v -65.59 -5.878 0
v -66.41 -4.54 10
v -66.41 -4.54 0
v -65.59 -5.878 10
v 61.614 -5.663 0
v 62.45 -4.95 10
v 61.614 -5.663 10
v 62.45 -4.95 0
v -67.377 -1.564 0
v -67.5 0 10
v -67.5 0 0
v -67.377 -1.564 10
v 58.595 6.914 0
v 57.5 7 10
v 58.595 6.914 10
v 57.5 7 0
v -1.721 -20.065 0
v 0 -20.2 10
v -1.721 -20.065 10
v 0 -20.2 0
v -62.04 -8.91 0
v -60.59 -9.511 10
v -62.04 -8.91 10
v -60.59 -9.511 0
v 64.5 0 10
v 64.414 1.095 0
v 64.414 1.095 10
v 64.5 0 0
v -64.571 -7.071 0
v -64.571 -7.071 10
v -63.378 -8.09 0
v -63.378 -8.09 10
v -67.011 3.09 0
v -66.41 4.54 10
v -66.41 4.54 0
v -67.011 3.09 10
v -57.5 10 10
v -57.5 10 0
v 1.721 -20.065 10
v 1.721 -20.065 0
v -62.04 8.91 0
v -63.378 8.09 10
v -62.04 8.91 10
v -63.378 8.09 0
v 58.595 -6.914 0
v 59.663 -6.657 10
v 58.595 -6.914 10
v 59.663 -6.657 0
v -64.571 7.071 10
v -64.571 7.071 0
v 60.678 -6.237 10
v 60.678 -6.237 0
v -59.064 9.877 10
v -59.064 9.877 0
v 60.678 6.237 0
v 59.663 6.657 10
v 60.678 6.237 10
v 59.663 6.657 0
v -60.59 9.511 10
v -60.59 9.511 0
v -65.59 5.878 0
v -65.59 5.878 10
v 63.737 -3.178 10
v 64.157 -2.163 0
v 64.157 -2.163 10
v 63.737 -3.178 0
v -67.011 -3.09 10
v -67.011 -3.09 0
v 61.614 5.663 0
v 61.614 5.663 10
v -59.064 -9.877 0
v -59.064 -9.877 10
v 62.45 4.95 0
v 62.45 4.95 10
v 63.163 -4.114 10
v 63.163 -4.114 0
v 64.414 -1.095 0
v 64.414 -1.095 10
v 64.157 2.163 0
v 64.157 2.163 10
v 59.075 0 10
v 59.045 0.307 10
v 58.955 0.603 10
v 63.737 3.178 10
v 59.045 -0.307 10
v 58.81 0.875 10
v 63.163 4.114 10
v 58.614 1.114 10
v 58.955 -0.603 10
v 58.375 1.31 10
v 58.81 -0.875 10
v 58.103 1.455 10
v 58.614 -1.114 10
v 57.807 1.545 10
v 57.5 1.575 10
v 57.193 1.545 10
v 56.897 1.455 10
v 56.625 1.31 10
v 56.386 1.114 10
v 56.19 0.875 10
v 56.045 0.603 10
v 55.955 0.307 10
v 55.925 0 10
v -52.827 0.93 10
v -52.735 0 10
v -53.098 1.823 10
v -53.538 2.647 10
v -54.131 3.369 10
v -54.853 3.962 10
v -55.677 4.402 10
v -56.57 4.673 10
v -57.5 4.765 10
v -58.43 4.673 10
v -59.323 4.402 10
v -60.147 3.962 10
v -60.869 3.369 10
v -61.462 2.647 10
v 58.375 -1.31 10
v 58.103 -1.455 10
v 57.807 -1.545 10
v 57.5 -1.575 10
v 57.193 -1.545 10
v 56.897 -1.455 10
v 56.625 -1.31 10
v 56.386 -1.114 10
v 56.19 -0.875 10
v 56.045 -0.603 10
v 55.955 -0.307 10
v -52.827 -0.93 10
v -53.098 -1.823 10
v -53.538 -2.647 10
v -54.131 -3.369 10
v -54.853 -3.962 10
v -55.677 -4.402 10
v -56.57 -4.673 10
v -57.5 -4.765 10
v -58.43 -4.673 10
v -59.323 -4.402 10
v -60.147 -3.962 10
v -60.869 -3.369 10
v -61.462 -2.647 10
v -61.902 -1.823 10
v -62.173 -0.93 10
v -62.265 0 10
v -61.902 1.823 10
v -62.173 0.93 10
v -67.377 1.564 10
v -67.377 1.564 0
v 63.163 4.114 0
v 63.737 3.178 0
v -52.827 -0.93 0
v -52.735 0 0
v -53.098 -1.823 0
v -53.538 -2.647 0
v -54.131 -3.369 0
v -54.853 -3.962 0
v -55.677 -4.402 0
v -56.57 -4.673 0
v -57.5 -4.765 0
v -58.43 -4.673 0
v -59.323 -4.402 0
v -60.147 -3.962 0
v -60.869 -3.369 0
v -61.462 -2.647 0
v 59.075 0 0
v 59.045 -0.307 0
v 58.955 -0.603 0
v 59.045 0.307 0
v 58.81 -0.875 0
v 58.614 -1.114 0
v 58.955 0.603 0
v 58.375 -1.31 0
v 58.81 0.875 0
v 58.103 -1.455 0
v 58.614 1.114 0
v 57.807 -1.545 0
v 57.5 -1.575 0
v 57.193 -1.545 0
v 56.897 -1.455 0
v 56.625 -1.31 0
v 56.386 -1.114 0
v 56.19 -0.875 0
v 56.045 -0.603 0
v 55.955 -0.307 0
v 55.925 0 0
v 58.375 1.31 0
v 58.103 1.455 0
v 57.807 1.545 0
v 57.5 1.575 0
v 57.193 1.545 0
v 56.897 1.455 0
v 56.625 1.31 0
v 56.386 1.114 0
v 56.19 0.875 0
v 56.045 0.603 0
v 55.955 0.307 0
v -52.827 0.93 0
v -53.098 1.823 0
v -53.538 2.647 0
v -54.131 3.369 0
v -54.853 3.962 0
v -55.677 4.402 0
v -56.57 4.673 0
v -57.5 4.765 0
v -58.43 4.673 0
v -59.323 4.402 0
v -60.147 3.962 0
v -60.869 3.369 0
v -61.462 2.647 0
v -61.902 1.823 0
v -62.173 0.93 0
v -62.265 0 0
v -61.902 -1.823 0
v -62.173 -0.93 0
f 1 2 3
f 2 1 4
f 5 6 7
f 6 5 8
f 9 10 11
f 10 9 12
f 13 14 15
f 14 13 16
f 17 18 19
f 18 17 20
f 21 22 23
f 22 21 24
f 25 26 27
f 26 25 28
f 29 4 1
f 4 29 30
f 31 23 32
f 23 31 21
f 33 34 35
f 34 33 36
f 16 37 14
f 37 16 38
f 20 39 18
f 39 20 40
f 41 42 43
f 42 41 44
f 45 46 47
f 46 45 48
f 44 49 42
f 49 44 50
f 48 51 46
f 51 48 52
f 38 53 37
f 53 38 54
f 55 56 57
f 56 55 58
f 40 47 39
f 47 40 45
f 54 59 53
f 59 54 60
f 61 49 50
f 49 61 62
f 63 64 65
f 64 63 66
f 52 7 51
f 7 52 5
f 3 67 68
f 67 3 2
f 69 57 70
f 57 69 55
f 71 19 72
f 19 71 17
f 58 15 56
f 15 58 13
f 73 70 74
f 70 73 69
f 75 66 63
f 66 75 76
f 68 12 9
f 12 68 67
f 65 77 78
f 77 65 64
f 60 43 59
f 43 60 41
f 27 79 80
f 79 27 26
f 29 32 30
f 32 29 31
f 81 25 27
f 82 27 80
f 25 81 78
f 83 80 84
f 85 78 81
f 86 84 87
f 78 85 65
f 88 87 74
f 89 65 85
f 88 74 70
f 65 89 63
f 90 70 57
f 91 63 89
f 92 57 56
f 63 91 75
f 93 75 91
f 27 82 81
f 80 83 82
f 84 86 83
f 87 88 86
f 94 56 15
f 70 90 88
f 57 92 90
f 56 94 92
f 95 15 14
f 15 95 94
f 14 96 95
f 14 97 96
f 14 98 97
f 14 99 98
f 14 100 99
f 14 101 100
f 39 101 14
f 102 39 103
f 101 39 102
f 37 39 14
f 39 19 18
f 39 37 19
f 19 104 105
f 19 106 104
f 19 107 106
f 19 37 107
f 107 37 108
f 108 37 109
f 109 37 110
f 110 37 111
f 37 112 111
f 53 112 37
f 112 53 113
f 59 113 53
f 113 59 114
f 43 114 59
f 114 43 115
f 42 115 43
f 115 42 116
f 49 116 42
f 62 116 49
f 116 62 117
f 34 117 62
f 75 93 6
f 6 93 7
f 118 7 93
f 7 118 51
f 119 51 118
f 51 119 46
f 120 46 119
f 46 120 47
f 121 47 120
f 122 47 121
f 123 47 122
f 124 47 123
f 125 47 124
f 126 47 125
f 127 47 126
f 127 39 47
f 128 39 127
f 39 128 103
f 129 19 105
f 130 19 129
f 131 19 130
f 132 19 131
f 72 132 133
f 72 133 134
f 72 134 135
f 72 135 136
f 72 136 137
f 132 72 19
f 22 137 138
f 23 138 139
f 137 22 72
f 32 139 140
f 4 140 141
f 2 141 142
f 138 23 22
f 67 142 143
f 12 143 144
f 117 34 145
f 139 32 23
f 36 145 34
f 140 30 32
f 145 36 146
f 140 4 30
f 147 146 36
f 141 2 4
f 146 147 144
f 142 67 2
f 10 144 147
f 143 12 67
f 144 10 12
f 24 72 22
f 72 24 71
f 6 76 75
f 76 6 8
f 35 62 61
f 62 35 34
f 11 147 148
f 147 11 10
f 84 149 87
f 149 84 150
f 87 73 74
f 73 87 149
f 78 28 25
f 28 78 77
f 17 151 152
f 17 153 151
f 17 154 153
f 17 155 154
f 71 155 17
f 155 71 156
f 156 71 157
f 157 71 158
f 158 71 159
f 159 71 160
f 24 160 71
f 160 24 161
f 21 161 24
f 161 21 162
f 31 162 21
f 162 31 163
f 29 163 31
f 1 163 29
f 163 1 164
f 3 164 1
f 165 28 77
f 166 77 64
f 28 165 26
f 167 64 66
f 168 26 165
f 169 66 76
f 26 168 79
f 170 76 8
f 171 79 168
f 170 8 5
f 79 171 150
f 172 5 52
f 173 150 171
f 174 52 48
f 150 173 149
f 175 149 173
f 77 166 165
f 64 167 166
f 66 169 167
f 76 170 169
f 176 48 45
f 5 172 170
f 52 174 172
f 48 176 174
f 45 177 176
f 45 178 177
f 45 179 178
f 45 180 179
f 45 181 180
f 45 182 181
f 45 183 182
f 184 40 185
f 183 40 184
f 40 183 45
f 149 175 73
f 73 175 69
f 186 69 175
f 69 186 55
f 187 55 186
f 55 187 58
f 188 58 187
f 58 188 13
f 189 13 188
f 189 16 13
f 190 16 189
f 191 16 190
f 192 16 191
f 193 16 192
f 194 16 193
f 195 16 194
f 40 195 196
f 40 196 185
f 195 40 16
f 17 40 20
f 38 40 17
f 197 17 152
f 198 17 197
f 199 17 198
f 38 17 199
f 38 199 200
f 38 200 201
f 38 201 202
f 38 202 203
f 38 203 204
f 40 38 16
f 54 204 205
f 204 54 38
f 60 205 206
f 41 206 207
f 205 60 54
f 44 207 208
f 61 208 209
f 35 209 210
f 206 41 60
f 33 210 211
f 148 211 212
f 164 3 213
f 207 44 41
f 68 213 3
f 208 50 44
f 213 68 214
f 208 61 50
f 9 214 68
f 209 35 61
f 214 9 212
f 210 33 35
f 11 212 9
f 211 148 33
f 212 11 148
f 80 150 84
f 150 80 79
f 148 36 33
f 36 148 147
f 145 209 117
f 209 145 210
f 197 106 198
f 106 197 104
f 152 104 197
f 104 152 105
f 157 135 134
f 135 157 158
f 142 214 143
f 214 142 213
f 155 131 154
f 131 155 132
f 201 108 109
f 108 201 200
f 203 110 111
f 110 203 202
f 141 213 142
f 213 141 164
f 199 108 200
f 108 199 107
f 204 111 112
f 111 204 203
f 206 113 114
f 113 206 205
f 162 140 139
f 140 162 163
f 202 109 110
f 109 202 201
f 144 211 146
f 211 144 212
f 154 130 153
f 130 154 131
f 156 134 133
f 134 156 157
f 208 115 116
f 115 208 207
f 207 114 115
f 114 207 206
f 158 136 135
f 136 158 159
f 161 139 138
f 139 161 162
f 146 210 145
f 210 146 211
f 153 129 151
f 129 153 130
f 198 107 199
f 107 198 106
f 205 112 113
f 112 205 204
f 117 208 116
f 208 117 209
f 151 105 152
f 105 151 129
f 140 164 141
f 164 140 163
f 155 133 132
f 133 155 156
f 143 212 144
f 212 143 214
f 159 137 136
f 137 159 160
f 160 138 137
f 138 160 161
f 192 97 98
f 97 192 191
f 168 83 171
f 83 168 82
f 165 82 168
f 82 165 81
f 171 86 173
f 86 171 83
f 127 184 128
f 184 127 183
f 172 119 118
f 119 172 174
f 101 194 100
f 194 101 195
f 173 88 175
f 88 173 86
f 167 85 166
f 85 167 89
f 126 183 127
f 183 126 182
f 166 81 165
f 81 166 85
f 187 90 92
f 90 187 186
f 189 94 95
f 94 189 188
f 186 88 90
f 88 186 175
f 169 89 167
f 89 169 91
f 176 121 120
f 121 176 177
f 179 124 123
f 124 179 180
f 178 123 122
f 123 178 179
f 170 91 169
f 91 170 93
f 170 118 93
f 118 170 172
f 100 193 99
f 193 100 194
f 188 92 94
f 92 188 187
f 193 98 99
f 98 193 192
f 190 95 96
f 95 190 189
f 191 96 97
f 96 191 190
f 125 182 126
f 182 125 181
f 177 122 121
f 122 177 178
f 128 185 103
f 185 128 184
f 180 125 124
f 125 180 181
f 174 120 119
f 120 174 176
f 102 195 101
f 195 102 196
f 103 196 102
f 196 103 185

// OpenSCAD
$fn = 32;

// ----------------------------------------------------------------------
// Lever: 115 mm between the bosses, 10 mm thick, smooth outline
// ----------------------------------------------------------------------

// --- parameters (mm) ---
lever_l = 115;            // distance between the boss centres
boss_a = 20;              // first boss diameter
boss_b = 14;              // second boss diameter
bore_a = 9.53;            // first bore
bore_b = 3.15;            // second bore
lever_t = 10;             // lever thickness
boss_c = 22;              // middle boss diameter
bend = 9.2;               // how far the middle boss drops

lever_profile = [[-67.5, 0], [-67.377, -1.564], [-67.011, -3.09], [-66.41, -4.54], [-65.59, -5.878], [-64.571, -7.071], [-63.378, -8.09], [-62.04, -8.91], [-60.59, -9.511], [-59.064, -9.877], [-1.721, -20.065], [0, -20.2], [1.721, -20.065], [58.595, -6.914], [59.663, -6.657], [60.678, -6.237], [61.614, -5.663], [62.45, -4.95], [63.163, -4.114], [63.737, -3.178], [64.157, -2.163], [64.414, -1.095], [64.5, 0], [64.414, 1.095], [64.157, 2.163], [63.737, 3.178], [63.163, 4.114], [62.45, 4.95], [61.614, 5.663], [60.678, 6.237], [59.663, 6.657], [58.595, 6.914], [57.5, 7], [-57.5, 10], [-59.064, 9.877], [-60.59, 9.511], [-62.04, 8.91], [-63.378, 8.09], [-64.571, 7.071], [-65.59, 5.878], [-66.41, 4.54], [-67.011, 3.09], [-67.377, 1.564]];

difference() {
  linear_extrude(height = lever_t) polygon(lever_profile);
  translate([-57.5, 0, -2.5]) cylinder(h = lever_t + 5, d = bore_a);
  translate([57.5, 0, -2.5]) cylinder(h = lever_t + 5, d = bore_b);
}
